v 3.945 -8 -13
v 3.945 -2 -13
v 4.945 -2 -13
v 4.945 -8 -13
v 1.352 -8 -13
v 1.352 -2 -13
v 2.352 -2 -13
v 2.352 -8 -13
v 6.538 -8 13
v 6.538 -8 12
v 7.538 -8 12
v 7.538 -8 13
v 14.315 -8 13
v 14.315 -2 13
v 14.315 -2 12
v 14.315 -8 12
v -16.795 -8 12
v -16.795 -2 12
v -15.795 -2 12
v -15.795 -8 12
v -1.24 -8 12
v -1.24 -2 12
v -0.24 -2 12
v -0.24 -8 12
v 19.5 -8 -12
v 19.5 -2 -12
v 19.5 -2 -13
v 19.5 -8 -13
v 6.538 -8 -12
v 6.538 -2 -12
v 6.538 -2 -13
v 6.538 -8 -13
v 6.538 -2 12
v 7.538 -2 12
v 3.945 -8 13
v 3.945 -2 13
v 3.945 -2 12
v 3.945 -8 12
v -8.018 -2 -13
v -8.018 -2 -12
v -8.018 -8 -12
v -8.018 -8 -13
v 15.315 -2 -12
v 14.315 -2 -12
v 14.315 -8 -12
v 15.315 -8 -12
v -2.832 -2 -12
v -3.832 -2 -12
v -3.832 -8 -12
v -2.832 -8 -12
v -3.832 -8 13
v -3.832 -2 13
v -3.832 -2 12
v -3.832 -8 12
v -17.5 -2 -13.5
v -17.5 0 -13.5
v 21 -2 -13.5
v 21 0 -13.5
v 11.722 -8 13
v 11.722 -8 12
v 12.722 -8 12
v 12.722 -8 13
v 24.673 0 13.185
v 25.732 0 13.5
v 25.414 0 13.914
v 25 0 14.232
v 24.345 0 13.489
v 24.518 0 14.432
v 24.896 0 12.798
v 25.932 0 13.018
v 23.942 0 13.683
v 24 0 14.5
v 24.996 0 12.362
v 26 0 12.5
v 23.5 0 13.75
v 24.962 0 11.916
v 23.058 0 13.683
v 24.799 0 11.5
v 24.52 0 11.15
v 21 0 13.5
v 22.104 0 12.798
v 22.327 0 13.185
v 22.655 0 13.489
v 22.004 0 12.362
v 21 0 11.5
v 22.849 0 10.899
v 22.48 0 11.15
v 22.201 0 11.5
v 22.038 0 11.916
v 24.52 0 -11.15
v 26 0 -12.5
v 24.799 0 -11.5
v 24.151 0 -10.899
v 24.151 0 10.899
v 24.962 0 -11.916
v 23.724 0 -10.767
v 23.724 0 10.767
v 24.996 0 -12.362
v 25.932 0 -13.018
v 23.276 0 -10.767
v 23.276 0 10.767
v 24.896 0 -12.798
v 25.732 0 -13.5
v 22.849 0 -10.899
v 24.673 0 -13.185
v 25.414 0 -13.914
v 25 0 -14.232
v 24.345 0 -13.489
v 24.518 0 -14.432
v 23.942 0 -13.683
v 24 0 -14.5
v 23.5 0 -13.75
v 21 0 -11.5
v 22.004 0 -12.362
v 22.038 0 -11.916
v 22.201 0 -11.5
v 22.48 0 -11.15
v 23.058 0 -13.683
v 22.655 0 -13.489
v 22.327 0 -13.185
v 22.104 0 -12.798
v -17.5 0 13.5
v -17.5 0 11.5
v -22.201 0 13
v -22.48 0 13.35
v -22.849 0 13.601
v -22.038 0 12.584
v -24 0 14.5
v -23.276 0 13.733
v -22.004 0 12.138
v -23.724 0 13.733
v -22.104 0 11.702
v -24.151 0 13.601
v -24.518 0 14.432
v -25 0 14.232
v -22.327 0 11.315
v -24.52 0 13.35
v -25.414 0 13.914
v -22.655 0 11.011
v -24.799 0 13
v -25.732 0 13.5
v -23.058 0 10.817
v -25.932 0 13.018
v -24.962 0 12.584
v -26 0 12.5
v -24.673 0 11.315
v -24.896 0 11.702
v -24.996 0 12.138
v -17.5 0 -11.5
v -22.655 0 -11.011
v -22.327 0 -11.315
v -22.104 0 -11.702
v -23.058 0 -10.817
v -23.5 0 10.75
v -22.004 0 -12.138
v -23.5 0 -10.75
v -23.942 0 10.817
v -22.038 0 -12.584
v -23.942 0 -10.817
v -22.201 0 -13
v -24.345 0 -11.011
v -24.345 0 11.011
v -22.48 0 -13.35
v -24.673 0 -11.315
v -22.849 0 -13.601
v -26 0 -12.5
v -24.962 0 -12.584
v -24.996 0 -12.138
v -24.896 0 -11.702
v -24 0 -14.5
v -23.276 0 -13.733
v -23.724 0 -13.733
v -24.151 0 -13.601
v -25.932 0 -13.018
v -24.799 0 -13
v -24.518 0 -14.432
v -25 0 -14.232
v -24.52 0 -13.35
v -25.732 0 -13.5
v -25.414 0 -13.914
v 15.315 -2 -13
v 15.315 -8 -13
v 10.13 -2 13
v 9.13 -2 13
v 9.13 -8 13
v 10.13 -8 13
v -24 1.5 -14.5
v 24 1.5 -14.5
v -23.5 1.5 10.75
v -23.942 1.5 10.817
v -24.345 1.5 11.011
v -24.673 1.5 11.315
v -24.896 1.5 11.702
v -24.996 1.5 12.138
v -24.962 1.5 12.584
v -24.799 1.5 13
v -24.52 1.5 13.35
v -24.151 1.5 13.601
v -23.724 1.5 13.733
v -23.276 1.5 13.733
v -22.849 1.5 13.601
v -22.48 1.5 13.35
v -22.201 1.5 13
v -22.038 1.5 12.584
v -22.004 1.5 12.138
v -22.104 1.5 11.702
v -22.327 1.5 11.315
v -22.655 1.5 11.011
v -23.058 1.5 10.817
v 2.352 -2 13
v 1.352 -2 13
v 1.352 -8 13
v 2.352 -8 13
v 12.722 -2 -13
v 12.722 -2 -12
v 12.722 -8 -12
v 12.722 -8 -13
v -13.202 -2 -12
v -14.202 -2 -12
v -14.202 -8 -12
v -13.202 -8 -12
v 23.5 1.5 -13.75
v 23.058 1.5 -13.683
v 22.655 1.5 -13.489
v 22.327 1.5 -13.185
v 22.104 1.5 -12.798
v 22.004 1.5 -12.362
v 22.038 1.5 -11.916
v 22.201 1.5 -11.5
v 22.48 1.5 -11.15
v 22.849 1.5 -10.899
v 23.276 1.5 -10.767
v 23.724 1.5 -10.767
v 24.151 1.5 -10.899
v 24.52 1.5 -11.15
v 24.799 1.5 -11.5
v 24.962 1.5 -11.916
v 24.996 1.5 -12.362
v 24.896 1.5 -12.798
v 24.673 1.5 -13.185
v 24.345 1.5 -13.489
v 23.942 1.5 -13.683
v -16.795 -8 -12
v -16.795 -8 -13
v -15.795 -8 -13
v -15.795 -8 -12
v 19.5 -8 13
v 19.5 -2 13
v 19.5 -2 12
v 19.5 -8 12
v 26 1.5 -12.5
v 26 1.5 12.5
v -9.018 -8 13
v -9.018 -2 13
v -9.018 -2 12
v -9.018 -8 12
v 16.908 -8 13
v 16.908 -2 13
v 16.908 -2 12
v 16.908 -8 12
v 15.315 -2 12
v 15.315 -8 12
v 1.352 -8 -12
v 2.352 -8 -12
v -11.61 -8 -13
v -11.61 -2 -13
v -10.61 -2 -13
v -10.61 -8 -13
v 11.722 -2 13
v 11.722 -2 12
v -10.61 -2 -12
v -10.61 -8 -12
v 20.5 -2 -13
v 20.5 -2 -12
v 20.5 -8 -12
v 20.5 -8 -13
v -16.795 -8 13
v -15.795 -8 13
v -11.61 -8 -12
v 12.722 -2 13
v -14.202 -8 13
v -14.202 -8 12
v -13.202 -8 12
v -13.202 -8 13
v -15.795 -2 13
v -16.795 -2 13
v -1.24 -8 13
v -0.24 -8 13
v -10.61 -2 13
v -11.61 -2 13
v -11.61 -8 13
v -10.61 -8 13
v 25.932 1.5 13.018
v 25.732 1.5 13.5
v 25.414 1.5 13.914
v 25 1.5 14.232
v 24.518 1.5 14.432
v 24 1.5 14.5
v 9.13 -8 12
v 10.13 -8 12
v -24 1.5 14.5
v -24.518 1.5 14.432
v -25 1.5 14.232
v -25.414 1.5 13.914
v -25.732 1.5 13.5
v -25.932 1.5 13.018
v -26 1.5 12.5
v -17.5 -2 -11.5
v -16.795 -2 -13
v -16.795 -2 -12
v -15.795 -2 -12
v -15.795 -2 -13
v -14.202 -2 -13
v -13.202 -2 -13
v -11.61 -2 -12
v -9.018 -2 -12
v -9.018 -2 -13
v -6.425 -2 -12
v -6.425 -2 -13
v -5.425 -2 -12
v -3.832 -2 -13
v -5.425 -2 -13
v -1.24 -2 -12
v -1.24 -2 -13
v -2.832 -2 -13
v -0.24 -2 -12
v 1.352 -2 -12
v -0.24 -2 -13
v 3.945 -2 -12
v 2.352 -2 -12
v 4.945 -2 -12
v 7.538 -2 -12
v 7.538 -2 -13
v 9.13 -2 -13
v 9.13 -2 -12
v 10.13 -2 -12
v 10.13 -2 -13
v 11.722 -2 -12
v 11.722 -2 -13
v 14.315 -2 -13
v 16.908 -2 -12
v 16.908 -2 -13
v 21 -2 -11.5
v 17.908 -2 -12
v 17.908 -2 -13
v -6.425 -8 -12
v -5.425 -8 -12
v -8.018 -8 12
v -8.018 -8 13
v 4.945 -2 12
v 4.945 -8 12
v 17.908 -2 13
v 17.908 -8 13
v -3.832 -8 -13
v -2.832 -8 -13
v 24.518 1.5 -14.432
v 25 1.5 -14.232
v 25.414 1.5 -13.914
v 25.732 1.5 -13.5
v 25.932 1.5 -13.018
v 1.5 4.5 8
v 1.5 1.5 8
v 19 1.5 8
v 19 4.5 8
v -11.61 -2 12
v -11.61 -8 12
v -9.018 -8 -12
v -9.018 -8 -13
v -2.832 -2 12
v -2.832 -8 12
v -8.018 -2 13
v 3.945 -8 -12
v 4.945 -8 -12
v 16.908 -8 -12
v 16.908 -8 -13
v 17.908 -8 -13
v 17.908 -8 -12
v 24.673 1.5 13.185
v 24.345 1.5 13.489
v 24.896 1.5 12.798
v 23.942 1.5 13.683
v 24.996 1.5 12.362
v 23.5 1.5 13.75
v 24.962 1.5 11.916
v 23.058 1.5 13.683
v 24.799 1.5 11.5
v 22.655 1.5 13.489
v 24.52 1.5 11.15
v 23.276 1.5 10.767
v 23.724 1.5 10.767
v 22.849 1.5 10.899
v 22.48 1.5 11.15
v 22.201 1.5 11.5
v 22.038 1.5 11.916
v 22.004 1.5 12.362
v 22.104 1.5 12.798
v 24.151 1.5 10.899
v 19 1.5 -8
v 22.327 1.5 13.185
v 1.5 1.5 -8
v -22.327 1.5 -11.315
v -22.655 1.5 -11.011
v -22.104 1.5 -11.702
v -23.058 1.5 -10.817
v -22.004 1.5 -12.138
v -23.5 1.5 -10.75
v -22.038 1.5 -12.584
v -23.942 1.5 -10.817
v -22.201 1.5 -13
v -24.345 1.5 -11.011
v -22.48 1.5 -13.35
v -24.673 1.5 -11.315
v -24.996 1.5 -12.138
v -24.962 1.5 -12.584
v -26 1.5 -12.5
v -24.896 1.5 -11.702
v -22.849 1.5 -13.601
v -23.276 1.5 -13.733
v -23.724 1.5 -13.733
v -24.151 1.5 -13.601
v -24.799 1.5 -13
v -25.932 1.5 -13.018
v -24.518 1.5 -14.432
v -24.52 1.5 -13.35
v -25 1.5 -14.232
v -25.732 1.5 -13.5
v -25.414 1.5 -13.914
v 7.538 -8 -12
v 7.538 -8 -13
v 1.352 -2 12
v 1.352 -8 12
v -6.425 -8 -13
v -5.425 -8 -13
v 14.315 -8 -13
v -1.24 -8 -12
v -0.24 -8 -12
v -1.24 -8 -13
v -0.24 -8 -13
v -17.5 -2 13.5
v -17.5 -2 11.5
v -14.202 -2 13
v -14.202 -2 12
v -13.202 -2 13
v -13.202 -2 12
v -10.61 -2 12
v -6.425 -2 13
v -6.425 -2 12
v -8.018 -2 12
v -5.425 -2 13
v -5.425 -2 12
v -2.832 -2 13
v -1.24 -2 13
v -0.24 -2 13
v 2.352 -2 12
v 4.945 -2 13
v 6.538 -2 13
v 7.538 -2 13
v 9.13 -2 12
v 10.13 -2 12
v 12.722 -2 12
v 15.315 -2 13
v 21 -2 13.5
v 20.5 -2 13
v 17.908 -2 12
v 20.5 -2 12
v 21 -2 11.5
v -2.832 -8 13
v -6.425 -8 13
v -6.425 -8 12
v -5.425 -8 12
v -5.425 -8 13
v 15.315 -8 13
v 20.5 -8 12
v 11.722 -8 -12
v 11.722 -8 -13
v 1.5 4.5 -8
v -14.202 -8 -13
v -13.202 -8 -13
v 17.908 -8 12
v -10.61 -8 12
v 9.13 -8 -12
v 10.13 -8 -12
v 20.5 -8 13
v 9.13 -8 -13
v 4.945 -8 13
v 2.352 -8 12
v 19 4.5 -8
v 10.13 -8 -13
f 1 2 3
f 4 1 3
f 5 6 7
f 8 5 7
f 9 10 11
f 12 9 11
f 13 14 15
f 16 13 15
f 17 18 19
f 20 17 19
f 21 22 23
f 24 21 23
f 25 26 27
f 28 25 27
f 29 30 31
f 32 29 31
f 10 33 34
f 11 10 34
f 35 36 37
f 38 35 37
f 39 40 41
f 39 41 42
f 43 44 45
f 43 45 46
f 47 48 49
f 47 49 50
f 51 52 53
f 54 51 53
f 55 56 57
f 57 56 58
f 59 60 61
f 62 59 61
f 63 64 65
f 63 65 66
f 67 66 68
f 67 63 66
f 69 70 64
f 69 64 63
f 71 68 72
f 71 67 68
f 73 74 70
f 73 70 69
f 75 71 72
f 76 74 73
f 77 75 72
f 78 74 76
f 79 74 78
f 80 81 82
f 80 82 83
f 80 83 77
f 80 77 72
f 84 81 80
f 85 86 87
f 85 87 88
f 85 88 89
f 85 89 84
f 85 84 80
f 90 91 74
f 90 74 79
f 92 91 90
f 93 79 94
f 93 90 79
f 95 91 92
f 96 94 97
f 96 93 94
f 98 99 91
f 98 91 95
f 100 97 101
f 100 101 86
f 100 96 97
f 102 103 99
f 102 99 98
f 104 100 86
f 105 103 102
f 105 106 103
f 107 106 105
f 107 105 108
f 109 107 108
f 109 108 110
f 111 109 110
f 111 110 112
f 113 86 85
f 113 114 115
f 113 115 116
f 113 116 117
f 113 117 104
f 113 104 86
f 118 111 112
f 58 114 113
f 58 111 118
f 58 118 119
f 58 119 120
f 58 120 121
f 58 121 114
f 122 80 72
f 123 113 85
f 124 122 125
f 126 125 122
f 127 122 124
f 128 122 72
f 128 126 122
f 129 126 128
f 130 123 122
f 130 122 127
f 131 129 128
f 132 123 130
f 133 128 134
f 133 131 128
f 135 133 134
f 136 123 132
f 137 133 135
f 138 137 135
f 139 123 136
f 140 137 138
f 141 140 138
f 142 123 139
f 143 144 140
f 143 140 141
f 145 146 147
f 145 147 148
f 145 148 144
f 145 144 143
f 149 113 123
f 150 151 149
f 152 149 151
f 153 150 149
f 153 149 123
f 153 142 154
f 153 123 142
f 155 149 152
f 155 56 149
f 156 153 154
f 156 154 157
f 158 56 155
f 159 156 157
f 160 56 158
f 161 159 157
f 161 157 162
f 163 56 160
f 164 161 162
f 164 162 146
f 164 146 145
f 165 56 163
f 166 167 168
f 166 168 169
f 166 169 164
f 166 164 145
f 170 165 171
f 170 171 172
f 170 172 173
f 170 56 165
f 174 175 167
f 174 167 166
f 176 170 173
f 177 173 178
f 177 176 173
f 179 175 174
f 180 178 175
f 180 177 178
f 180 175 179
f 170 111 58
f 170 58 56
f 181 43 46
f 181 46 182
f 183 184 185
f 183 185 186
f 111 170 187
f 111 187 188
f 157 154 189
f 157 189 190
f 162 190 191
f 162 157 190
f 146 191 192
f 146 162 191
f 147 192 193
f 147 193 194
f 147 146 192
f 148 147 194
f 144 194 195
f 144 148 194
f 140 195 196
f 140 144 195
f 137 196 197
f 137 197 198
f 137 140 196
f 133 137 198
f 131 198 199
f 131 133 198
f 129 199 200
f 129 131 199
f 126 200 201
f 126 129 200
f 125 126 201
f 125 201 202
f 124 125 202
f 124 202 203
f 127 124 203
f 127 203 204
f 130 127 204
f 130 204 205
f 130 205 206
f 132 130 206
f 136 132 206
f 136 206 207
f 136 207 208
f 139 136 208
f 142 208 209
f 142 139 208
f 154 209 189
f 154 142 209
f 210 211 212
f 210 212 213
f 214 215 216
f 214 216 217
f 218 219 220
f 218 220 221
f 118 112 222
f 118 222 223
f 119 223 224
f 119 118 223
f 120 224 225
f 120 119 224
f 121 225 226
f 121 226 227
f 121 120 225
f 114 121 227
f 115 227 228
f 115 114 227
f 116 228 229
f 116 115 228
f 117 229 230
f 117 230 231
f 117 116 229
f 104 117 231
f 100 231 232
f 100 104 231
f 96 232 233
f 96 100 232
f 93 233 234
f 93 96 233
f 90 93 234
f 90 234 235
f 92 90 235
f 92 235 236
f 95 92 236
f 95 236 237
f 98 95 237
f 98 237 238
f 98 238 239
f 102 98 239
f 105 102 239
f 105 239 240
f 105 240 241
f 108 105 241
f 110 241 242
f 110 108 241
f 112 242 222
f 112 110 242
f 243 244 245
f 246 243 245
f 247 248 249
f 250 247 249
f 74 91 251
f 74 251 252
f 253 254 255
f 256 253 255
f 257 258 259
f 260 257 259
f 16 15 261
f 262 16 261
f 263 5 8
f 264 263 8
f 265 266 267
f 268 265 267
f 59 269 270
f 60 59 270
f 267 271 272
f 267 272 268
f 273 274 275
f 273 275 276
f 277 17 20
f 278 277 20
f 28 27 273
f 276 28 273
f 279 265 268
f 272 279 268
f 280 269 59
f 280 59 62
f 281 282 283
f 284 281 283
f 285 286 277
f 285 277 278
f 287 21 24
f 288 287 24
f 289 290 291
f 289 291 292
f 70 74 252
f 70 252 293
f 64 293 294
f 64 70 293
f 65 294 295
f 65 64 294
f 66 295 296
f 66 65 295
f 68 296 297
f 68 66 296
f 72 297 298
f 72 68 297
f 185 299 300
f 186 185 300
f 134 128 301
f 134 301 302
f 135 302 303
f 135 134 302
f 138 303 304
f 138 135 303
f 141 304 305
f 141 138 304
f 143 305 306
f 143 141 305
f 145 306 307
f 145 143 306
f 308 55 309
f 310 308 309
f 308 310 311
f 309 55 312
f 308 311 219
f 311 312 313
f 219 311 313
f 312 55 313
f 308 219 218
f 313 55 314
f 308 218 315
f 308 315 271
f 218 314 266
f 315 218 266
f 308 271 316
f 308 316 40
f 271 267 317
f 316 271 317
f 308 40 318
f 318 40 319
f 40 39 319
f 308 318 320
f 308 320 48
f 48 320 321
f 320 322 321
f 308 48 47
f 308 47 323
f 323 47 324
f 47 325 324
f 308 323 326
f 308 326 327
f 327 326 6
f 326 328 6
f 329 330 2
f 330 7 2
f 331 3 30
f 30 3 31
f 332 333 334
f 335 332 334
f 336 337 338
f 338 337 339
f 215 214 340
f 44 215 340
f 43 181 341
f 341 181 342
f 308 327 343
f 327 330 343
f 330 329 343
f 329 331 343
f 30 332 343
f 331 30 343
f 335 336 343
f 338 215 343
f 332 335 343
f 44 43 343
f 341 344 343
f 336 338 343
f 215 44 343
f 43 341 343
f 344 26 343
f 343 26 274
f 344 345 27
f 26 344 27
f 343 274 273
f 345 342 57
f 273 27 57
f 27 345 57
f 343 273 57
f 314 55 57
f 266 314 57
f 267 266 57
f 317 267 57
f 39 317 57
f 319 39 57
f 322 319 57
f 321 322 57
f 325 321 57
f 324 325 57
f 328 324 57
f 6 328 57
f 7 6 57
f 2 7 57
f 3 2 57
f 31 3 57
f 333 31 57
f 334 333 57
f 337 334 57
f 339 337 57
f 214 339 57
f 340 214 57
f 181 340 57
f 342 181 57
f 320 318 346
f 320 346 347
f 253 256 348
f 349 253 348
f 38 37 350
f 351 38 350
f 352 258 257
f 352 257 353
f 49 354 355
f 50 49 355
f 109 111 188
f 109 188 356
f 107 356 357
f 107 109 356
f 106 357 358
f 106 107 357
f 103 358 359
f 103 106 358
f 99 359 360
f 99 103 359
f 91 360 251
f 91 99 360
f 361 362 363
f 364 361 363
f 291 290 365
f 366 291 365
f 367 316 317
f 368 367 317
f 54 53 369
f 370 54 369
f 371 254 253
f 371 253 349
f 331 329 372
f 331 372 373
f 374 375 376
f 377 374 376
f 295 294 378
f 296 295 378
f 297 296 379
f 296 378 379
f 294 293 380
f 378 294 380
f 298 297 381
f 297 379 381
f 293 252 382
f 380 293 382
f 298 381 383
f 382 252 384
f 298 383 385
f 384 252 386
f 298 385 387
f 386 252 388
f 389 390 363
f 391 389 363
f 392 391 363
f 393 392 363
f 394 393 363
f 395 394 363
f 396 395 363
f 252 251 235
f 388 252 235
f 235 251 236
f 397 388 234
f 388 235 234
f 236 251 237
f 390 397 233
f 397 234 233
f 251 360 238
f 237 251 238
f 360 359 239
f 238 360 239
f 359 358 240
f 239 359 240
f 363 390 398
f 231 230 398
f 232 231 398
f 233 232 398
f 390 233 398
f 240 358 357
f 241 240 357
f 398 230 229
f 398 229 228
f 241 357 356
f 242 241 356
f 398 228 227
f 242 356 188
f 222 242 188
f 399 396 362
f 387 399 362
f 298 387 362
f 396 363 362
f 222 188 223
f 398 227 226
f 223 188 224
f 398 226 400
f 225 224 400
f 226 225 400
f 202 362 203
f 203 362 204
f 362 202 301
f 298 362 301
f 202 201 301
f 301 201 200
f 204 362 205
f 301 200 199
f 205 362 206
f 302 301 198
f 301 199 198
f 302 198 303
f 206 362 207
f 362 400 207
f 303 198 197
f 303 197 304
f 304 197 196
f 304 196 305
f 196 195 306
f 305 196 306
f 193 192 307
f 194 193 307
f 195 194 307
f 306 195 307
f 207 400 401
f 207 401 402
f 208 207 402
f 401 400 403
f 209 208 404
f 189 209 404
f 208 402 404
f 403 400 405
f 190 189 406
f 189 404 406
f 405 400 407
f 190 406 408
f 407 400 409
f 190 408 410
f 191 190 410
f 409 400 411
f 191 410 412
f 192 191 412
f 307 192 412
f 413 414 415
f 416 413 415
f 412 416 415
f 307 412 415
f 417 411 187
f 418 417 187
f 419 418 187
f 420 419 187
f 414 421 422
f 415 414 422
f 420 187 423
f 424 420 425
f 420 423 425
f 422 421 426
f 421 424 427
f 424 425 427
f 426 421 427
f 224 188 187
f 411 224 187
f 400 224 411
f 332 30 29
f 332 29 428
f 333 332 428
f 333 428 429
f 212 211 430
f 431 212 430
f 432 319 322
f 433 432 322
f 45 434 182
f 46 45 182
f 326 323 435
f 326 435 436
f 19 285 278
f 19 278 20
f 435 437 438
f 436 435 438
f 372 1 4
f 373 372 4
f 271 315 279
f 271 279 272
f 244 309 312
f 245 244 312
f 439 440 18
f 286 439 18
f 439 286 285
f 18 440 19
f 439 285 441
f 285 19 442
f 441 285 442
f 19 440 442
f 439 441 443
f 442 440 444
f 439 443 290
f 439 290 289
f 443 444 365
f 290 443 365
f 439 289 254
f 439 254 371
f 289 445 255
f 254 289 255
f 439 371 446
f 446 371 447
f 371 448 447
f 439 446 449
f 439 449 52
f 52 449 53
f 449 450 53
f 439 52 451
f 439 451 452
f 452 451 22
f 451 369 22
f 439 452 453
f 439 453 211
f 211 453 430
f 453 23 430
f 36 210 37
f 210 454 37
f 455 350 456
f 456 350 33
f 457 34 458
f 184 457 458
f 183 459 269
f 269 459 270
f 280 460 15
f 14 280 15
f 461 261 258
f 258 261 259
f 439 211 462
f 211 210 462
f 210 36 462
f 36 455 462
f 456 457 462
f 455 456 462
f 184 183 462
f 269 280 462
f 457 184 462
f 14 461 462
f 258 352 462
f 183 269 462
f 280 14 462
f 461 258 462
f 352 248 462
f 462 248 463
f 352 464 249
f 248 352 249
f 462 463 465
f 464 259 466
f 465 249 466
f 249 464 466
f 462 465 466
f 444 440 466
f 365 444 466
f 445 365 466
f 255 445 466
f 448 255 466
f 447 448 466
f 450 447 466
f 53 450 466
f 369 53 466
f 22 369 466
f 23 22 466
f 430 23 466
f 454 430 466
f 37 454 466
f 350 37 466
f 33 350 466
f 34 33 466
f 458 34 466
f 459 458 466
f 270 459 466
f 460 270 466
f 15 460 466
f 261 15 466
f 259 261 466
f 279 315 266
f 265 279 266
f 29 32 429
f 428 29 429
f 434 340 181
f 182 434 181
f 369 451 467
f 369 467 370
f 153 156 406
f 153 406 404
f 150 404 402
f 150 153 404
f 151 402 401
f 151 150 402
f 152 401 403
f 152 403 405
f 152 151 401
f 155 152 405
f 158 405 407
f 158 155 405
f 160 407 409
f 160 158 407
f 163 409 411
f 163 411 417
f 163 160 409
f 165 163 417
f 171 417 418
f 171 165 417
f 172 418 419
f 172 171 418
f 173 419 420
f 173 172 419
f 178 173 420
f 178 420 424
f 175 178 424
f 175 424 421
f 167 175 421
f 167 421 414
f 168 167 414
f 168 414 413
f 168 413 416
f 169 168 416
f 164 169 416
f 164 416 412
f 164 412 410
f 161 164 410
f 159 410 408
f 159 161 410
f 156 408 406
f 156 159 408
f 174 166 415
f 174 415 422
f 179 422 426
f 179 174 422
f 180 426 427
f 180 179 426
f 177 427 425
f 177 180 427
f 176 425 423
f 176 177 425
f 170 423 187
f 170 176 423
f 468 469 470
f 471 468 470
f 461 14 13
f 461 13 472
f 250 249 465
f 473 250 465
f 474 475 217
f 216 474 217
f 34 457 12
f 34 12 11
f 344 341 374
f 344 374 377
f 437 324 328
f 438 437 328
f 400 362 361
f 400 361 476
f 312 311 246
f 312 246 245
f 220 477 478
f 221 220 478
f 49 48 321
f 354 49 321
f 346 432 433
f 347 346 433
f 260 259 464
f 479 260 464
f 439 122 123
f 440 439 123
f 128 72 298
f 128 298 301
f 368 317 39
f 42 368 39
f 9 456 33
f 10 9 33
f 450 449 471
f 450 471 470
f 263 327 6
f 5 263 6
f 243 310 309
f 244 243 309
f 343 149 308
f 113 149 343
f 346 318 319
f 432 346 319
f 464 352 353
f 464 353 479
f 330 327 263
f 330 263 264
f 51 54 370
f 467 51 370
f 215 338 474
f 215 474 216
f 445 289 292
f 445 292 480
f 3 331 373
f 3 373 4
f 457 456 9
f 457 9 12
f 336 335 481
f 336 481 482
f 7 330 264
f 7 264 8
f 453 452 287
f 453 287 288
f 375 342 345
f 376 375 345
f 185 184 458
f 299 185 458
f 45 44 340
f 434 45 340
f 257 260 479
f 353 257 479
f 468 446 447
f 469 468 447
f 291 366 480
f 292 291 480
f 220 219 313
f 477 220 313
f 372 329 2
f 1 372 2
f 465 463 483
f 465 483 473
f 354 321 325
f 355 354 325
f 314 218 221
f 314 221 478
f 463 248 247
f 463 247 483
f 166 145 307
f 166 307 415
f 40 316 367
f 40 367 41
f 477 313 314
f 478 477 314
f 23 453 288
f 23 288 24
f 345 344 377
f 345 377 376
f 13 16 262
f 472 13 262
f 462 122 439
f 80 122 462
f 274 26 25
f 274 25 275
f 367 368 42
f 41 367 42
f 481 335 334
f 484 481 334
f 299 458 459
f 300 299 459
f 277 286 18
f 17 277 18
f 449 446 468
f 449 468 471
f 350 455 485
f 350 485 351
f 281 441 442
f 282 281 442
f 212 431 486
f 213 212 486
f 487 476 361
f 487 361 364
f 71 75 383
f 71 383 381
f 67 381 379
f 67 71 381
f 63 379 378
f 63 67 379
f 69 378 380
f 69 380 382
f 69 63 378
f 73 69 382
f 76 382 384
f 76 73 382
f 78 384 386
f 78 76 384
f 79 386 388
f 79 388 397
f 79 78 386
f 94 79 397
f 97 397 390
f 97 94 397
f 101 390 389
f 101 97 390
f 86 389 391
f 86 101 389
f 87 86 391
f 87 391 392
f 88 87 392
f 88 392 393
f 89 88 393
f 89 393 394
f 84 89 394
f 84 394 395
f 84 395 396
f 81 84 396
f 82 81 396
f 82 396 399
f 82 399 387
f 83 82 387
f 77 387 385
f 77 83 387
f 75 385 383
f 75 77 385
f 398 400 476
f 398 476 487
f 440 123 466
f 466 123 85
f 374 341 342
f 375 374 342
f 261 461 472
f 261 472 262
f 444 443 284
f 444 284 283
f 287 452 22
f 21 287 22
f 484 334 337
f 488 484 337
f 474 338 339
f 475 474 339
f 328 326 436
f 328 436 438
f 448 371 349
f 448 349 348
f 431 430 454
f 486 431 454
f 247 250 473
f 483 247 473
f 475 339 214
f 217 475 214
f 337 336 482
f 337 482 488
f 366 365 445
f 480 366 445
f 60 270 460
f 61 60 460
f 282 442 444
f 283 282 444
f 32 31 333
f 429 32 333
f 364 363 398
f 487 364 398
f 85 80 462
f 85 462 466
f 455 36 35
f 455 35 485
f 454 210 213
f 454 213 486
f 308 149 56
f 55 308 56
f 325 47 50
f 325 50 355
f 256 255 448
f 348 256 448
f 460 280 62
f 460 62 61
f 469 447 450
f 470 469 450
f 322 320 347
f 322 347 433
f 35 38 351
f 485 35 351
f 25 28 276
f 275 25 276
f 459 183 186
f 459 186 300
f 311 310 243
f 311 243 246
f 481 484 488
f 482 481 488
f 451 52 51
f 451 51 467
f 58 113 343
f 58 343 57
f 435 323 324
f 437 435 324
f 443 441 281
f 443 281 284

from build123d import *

# Parameters (mm, degrees)
SKETCH1_R           = 1.5
BOSS_EXTRUDE1_DEPTH = 1.5
SKETCH2_W           = 38.5
SKETCH2_H           = 2
BOSS_EXTRUDE2_DEPTH = 2
SKETCH3_W           = 17.5
SKETCH3_H           = 16
BOSS_EXTRUDE3_DEPTH = 3
SKETCH4_W           = 1
SKETCH4_H           = 1
BOSS_EXTRUDE4_DEPTH = 8


with BuildPart() as part:
    # Sketch1 → Boss-Extrude1 (new body)
    with BuildSketch(Plane(origin=(0, 0, 0), x_dir=(1, 0, 0), z_dir=(0, 1, 0))):
        with BuildLine():
            Line((24, -14.5), (-24, -14.5))
            ThreePointArc((-24, -14.5), (-25.414213562, -13.914213562), (-26, -12.5))
            Line((-26, -12.5), (-26, 12.5))
            ThreePointArc((-26, 12.5), (-25.414213562, 13.914213562), (-24, 14.5))
            Line((-24, 14.5), (24, 14.5))
            ThreePointArc((24, 14.5), (25.414213562, 13.914213562), (26, 12.5))
            Line((26, 12.5), (26, -12.5))
            ThreePointArc((26, -12.5), (25.414213562, -13.914213562), (24, -14.5))
        make_face()
        with Locations(Location((-23.5, 12.25, 0), (0, 0, 270))):
            Circle(SKETCH1_R, mode=Mode.SUBTRACT)
        with Locations(Location((23.5, 12.25, 0), (0, 0, 90))):
            Circle(SKETCH1_R, mode=Mode.SUBTRACT)
        with Locations(Location((23.5, -12.25, 0), (0, 0, 270))):
            Circle(SKETCH1_R, mode=Mode.SUBTRACT)
        with Locations(Location((-23.5, -12.25, 0), (0, 0, 90))):
            Circle(SKETCH1_R, mode=Mode.SUBTRACT)
    extrude(amount=BOSS_EXTRUDE1_DEPTH)

    # Sketch2 → Boss-Extrude2 (add)
    with BuildSketch(Plane(origin=(0, 0, 0), x_dir=(1, 0, 0), z_dir=(0, 1, 0))):
        with Locations((1.75, -12.5)):
            Rectangle(SKETCH2_W, SKETCH2_H)
        with Locations((1.75, 12.5)):
            Rectangle(SKETCH2_W, SKETCH2_H)
    extrude(amount=-BOSS_EXTRUDE2_DEPTH)

    # Sketch3 → Boss-Extrude3 (add)
    with BuildSketch(Plane(origin=(0, 1.5, 0), x_dir=(1, 0, 0), z_dir=(0, 1, 0))):
        with Locations((10.25, 0)):
            Rectangle(SKETCH3_W, SKETCH3_H)
    extrude(amount=BOSS_EXTRUDE3_DEPTH)

    # Sketch4 → Boss-Extrude4 (add)
    with BuildSketch(Plane(origin=(0, 0, 0), x_dir=(1, 0, 0), z_dir=(0, 1, 0))):
        with Locations((20, 12.5)):
            Rectangle(SKETCH4_W, SKETCH4_H)
        with Locations((17.4075, 12.5)):
            Rectangle(SKETCH4_W, SKETCH4_H)
        with Locations((14.815, 12.5)):
            Rectangle(SKETCH4_W, SKETCH4_H)
        with Locations((12.2225, 12.5)):
            Rectangle(SKETCH4_W, SKETCH4_H)
        with Locations((9.63, 12.5)):
            Rectangle(SKETCH4_W, SKETCH4_H)
        with Locations((7.0375, 12.5)):
            Rectangle(SKETCH4_W, SKETCH4_H)
        with Locations((4.445, 12.5)):
            Rectangle(SKETCH4_W, SKETCH4_H)
        with Locations((1.8525, 12.5)):
            Rectangle(SKETCH4_W, SKETCH4_H)
        with Locations((-0.74, 12.5)):
            Rectangle(SKETCH4_W, SKETCH4_H)
        with Locations((-3.3325, 12.5)):
            Rectangle(SKETCH4_W, SKETCH4_H)
        with Locations((-5.925, 12.5)):
            Rectangle(SKETCH4_W, SKETCH4_H)
        with Locations((-8.5175, 12.5)):
            Rectangle(SKETCH4_W, SKETCH4_H)
        with Locations((-11.11, 12.5)):
            Rectangle(SKETCH4_W, SKETCH4_H)
        with Locations((-13.7025, 12.5)):
            Rectangle(SKETCH4_W, SKETCH4_H)
        with Locations((-16.295, 12.5)):
            Rectangle(SKETCH4_W, SKETCH4_H)
        with Locations((-16.295, -12.5)):
            Rectangle(SKETCH4_W, SKETCH4_H)
        with Locations((-13.7025, -12.5)):
            Rectangle(SKETCH4_W, SKETCH4_H)
        with Locations((-11.11, -12.5)):
            Rectangle(SKETCH4_W, SKETCH4_H)
        with Locations((-8.5175, -12.5)):
            Rectangle(SKETCH4_W, SKETCH4_H)
        with Locations((-5.925, -12.5)):
            Rectangle(SKETCH4_W, SKETCH4_H)
        with Locations((-3.3325, -12.5)):
            Rectangle(SKETCH4_W, SKETCH4_H)
        with Locations((-0.74, -12.5)):
            Rectangle(SKETCH4_W, SKETCH4_H)
        with Locations((1.8525, -12.5)):
            Rectangle(SKETCH4_W, SKETCH4_H)
        with Locations((4.445, -12.5)):
            Rectangle(SKETCH4_W, SKETCH4_H)
        with Locations((7.0375, -12.5)):
            Rectangle(SKETCH4_W, SKETCH4_H)
        with Locations((9.63, -12.5)):
            Rectangle(SKETCH4_W, SKETCH4_H)
        with Locations((12.2225, -12.5)):
            Rectangle(SKETCH4_W, SKETCH4_H)
        with Locations((14.815, -12.5)):
            Rectangle(SKETCH4_W, SKETCH4_H)
        with Locations((17.4075, -12.5)):
            Rectangle(SKETCH4_W, SKETCH4_H)
        with Locations((20, -12.5)):
            Rectangle(SKETCH4_W, SKETCH4_H)
    extrude(amount=-BOSS_EXTRUDE4_DEPTH)


solid = part.part
